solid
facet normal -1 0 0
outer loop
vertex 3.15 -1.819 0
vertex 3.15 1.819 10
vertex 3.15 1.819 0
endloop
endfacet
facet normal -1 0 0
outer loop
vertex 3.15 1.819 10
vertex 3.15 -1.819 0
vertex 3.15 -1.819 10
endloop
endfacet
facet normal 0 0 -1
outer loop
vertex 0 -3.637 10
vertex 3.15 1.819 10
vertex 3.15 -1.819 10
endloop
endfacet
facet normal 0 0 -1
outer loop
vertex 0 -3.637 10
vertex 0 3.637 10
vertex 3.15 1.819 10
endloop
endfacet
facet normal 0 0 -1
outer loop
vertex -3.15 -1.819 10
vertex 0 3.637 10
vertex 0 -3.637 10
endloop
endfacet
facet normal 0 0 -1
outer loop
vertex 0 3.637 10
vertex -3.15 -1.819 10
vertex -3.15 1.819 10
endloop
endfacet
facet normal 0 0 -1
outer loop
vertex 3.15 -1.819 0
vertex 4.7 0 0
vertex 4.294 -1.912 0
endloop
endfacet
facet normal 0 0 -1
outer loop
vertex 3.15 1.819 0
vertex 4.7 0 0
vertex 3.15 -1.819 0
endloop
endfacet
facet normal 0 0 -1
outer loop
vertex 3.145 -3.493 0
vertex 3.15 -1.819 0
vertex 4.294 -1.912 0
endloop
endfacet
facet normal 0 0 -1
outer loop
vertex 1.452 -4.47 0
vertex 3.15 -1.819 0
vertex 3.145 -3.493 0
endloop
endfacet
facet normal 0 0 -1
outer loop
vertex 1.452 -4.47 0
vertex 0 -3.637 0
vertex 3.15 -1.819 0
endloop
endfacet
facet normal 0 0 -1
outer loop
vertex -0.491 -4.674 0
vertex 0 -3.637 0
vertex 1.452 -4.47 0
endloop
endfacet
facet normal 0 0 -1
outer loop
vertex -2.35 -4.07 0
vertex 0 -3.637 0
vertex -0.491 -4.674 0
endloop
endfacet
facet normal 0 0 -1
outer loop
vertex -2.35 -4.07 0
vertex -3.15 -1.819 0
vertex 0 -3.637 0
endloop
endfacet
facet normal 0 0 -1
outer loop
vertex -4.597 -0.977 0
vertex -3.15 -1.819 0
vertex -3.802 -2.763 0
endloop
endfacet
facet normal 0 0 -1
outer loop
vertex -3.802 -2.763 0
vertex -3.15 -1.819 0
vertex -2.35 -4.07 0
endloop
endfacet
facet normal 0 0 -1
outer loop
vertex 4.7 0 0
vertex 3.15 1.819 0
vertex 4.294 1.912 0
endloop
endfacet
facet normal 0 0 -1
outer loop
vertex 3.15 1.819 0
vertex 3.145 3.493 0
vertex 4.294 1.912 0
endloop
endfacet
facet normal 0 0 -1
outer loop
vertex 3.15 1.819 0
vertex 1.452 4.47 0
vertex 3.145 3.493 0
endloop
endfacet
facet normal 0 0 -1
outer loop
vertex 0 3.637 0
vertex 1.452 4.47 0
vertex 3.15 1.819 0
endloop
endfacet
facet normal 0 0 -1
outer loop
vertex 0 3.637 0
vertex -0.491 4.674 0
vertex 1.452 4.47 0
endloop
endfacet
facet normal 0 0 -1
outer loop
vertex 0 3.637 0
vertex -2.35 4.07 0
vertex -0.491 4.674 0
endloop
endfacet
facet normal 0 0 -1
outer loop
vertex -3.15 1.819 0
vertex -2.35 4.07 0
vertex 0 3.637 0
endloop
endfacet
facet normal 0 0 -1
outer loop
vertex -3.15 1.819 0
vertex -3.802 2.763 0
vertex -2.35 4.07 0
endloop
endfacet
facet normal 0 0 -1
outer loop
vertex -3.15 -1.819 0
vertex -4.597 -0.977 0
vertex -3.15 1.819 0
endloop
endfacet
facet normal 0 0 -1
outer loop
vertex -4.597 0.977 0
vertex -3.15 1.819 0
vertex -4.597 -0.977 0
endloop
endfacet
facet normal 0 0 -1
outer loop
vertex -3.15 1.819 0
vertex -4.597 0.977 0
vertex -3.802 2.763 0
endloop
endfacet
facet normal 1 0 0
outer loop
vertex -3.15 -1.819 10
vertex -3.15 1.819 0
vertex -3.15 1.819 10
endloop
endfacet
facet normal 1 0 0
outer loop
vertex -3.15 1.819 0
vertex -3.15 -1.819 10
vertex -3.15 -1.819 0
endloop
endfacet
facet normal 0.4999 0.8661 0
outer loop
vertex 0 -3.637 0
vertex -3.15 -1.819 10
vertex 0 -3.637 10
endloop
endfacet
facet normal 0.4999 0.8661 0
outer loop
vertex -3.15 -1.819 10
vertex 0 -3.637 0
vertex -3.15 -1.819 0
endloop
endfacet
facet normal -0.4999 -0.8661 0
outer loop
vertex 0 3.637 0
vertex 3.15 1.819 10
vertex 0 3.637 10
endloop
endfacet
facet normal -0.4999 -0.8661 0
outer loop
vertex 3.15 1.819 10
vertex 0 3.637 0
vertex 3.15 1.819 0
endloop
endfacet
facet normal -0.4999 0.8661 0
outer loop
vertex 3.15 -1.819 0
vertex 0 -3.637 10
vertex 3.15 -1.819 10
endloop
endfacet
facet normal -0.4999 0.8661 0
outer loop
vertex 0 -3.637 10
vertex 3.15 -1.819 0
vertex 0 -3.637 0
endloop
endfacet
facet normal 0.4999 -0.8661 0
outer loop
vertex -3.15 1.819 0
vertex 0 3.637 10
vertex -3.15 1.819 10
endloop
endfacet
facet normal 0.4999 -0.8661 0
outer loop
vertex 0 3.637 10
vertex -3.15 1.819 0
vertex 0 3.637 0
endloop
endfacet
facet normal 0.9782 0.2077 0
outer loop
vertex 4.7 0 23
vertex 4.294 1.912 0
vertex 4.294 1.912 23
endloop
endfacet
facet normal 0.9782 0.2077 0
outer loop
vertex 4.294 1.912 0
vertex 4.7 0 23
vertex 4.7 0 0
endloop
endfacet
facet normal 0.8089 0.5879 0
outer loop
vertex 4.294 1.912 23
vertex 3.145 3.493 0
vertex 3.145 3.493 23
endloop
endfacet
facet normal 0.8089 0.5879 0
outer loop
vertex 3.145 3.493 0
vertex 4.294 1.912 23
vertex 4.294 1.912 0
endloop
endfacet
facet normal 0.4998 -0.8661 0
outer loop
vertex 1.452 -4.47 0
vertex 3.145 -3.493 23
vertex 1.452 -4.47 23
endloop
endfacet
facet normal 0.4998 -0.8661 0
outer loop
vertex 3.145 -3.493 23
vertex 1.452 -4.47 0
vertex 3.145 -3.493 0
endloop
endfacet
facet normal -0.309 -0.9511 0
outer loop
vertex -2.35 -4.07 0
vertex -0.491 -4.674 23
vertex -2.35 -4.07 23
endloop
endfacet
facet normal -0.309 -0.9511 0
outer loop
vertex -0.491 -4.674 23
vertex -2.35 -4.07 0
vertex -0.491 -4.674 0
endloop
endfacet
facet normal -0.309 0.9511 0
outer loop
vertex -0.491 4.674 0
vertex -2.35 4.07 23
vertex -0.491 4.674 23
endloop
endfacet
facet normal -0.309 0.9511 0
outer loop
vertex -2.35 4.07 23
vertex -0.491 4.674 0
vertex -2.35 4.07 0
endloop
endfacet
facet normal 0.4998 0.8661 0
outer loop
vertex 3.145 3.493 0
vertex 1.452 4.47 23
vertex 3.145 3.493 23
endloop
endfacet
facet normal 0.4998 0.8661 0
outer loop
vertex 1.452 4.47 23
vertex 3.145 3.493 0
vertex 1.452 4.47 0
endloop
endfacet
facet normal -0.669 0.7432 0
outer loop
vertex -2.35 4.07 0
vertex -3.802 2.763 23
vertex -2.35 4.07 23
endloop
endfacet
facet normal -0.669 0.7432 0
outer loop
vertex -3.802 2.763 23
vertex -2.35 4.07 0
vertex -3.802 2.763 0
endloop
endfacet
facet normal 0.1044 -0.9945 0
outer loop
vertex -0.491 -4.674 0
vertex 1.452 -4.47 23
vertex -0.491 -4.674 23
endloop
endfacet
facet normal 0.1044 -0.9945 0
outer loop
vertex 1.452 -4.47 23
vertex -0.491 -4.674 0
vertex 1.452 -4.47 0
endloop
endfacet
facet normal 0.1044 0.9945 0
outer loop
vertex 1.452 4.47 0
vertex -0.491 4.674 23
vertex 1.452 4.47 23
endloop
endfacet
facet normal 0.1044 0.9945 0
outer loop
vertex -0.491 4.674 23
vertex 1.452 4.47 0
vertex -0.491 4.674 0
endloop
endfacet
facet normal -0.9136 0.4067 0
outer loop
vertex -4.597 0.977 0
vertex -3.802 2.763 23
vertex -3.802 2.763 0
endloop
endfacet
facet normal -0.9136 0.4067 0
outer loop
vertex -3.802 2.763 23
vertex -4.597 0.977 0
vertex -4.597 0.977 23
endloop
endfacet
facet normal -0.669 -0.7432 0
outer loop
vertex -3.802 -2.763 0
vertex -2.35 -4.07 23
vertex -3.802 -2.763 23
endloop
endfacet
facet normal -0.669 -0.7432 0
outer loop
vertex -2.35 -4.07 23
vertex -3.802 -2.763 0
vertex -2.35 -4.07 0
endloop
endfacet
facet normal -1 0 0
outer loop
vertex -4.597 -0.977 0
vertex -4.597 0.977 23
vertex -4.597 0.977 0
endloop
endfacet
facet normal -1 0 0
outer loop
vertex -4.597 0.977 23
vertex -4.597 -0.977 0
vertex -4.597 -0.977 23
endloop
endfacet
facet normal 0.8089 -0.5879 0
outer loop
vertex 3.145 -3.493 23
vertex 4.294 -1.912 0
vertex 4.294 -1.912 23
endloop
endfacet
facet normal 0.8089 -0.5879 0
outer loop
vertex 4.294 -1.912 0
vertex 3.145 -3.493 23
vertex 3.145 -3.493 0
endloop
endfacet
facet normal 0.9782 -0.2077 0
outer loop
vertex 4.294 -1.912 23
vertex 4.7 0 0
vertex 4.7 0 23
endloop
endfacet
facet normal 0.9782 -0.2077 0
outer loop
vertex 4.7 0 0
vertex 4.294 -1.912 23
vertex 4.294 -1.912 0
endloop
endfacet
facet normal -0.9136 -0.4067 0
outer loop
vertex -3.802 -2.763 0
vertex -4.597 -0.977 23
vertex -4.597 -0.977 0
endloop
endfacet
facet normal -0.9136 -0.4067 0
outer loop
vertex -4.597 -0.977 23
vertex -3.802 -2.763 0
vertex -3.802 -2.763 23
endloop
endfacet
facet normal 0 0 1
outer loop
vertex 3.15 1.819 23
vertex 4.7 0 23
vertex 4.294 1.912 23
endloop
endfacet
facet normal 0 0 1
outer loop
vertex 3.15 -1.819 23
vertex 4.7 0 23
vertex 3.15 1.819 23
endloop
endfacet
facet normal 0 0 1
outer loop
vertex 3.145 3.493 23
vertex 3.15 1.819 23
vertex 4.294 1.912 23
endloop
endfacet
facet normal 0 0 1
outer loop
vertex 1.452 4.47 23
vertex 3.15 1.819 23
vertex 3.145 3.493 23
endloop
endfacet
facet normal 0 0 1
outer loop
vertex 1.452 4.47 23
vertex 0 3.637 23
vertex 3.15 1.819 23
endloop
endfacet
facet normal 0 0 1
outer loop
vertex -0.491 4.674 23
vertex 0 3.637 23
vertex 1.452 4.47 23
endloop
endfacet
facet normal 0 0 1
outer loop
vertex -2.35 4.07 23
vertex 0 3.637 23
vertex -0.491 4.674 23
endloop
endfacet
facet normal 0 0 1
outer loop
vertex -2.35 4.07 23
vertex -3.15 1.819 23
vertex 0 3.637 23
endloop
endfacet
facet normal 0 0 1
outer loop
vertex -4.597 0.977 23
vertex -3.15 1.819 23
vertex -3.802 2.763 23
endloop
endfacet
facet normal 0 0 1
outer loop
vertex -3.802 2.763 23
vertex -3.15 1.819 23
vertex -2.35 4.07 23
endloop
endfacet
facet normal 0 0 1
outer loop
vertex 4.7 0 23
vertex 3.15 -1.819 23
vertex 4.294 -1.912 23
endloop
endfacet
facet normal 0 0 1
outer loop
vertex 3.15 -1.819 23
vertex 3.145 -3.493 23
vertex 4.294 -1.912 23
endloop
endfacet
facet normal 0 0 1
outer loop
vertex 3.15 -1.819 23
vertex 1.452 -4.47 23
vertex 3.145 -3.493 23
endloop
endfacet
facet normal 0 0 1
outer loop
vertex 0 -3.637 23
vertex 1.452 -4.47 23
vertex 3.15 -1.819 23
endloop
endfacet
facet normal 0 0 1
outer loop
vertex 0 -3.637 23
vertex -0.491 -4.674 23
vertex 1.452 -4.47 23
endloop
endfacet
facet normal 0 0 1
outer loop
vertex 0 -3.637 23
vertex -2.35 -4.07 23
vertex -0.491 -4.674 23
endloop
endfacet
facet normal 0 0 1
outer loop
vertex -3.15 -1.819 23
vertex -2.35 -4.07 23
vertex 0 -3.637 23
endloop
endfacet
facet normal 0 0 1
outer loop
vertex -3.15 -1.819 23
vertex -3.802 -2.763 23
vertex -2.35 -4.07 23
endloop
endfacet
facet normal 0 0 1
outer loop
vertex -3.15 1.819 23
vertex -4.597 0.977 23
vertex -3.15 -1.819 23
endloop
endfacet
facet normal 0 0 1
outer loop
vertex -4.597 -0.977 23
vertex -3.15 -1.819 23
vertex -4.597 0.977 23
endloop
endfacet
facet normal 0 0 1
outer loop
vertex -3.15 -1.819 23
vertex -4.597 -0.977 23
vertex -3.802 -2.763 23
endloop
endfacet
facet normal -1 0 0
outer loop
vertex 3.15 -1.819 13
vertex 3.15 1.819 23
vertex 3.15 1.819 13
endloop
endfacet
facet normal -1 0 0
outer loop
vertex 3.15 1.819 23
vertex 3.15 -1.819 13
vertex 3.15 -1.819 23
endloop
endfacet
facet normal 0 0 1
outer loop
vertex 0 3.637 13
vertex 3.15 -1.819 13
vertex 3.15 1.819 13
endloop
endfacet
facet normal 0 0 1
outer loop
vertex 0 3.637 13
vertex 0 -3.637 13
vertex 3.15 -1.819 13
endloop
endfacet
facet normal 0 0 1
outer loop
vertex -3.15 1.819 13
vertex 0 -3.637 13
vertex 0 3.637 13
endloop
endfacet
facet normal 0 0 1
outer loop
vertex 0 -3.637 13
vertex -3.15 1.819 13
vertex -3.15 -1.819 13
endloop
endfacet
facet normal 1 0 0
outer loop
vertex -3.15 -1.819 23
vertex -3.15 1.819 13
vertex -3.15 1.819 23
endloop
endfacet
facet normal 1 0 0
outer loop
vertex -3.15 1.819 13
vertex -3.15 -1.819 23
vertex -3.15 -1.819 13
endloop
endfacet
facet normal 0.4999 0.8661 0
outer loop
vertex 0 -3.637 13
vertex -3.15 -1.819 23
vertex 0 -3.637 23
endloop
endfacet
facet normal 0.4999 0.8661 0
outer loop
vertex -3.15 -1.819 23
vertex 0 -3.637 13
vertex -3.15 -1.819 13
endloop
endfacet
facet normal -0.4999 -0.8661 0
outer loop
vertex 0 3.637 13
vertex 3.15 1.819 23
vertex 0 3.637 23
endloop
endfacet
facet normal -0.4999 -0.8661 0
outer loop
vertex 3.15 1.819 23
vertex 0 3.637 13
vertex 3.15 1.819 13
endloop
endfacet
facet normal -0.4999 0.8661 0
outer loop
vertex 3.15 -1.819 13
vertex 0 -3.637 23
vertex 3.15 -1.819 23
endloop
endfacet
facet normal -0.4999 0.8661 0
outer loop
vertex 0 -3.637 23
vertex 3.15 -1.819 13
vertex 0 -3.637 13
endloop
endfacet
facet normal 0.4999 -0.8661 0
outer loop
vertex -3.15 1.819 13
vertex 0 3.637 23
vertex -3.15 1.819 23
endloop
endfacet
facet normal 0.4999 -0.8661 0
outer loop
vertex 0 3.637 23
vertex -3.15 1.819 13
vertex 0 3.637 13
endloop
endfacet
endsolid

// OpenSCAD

/* [Adapter Type] */
type=2; // [1:pin+hole,2:hole+hole]
/* [Adapter shape] */
//exterior of the adapter
form=1; // [1:cylinder,2:hexagon]
/* [Bit size] */
// size of the bit in mm
size=6.2;
// Deep of the hole for the bit in mm
deep=10;
/* [Joint parameters] */
//how much to add to bit size for external diameter of extender (teoretically affect the hardeness, of course the print setting also important)
diameter=3; // [1:1mm,2:2mm,3:3mm,4:4mm,5:5mm, 6:6mm]
// distance (in mm.) between two bit's holes inside the adapter. May be used to get long adapter. Full adapter height=deep*2+distance
distance=3;
/* [Material properties] */
// Shrinkage is differ for materials. Size of holes will be increased forthis value. Try  the default, correct if too tight.
shrinkage=0.1;

if (distance<2) {
    distance=2;
    };

radius=(diameter+size)/2;
    
if (type==2){
difference(){
difference(){
if (form==1){
cylinder(deep*2+distance,r=radius+shrinkage,center=false);
}else{
    Hexagone(radius*2,deep*2+distance);
};
Hexagone(size+shrinkage,deep);
    };
translate([0,0,deep+distance]) {Hexagone(size+shrinkage,deep);
    };
};
} else {
difference(){
if (form==1) {
    cylinder(deep+distance,r=radius+shrinkage,center=false);
} else {
    Hexagone(radius*2,deep+distance);
};
Hexagone(size+shrinkage,deep);
};
translate([0,0,deep+distance]) {Hexagone(size-shrinkage,deep);
    };
};
function cot(x)=1/tan(x);
module Hexagone(size,height)
{
	angle = 60;		
	width = size * cot(angle);

    translate([0,0,height/2]){

	union()
	{
		rotate([0,0,0])
			cube([size,width,height],center=true);
		rotate([0,0,angle])
			cube([size,width,height],center=true);
		rotate([0,0,2*angle])
			cube([size,width,height],center=true);
	}
};
}
